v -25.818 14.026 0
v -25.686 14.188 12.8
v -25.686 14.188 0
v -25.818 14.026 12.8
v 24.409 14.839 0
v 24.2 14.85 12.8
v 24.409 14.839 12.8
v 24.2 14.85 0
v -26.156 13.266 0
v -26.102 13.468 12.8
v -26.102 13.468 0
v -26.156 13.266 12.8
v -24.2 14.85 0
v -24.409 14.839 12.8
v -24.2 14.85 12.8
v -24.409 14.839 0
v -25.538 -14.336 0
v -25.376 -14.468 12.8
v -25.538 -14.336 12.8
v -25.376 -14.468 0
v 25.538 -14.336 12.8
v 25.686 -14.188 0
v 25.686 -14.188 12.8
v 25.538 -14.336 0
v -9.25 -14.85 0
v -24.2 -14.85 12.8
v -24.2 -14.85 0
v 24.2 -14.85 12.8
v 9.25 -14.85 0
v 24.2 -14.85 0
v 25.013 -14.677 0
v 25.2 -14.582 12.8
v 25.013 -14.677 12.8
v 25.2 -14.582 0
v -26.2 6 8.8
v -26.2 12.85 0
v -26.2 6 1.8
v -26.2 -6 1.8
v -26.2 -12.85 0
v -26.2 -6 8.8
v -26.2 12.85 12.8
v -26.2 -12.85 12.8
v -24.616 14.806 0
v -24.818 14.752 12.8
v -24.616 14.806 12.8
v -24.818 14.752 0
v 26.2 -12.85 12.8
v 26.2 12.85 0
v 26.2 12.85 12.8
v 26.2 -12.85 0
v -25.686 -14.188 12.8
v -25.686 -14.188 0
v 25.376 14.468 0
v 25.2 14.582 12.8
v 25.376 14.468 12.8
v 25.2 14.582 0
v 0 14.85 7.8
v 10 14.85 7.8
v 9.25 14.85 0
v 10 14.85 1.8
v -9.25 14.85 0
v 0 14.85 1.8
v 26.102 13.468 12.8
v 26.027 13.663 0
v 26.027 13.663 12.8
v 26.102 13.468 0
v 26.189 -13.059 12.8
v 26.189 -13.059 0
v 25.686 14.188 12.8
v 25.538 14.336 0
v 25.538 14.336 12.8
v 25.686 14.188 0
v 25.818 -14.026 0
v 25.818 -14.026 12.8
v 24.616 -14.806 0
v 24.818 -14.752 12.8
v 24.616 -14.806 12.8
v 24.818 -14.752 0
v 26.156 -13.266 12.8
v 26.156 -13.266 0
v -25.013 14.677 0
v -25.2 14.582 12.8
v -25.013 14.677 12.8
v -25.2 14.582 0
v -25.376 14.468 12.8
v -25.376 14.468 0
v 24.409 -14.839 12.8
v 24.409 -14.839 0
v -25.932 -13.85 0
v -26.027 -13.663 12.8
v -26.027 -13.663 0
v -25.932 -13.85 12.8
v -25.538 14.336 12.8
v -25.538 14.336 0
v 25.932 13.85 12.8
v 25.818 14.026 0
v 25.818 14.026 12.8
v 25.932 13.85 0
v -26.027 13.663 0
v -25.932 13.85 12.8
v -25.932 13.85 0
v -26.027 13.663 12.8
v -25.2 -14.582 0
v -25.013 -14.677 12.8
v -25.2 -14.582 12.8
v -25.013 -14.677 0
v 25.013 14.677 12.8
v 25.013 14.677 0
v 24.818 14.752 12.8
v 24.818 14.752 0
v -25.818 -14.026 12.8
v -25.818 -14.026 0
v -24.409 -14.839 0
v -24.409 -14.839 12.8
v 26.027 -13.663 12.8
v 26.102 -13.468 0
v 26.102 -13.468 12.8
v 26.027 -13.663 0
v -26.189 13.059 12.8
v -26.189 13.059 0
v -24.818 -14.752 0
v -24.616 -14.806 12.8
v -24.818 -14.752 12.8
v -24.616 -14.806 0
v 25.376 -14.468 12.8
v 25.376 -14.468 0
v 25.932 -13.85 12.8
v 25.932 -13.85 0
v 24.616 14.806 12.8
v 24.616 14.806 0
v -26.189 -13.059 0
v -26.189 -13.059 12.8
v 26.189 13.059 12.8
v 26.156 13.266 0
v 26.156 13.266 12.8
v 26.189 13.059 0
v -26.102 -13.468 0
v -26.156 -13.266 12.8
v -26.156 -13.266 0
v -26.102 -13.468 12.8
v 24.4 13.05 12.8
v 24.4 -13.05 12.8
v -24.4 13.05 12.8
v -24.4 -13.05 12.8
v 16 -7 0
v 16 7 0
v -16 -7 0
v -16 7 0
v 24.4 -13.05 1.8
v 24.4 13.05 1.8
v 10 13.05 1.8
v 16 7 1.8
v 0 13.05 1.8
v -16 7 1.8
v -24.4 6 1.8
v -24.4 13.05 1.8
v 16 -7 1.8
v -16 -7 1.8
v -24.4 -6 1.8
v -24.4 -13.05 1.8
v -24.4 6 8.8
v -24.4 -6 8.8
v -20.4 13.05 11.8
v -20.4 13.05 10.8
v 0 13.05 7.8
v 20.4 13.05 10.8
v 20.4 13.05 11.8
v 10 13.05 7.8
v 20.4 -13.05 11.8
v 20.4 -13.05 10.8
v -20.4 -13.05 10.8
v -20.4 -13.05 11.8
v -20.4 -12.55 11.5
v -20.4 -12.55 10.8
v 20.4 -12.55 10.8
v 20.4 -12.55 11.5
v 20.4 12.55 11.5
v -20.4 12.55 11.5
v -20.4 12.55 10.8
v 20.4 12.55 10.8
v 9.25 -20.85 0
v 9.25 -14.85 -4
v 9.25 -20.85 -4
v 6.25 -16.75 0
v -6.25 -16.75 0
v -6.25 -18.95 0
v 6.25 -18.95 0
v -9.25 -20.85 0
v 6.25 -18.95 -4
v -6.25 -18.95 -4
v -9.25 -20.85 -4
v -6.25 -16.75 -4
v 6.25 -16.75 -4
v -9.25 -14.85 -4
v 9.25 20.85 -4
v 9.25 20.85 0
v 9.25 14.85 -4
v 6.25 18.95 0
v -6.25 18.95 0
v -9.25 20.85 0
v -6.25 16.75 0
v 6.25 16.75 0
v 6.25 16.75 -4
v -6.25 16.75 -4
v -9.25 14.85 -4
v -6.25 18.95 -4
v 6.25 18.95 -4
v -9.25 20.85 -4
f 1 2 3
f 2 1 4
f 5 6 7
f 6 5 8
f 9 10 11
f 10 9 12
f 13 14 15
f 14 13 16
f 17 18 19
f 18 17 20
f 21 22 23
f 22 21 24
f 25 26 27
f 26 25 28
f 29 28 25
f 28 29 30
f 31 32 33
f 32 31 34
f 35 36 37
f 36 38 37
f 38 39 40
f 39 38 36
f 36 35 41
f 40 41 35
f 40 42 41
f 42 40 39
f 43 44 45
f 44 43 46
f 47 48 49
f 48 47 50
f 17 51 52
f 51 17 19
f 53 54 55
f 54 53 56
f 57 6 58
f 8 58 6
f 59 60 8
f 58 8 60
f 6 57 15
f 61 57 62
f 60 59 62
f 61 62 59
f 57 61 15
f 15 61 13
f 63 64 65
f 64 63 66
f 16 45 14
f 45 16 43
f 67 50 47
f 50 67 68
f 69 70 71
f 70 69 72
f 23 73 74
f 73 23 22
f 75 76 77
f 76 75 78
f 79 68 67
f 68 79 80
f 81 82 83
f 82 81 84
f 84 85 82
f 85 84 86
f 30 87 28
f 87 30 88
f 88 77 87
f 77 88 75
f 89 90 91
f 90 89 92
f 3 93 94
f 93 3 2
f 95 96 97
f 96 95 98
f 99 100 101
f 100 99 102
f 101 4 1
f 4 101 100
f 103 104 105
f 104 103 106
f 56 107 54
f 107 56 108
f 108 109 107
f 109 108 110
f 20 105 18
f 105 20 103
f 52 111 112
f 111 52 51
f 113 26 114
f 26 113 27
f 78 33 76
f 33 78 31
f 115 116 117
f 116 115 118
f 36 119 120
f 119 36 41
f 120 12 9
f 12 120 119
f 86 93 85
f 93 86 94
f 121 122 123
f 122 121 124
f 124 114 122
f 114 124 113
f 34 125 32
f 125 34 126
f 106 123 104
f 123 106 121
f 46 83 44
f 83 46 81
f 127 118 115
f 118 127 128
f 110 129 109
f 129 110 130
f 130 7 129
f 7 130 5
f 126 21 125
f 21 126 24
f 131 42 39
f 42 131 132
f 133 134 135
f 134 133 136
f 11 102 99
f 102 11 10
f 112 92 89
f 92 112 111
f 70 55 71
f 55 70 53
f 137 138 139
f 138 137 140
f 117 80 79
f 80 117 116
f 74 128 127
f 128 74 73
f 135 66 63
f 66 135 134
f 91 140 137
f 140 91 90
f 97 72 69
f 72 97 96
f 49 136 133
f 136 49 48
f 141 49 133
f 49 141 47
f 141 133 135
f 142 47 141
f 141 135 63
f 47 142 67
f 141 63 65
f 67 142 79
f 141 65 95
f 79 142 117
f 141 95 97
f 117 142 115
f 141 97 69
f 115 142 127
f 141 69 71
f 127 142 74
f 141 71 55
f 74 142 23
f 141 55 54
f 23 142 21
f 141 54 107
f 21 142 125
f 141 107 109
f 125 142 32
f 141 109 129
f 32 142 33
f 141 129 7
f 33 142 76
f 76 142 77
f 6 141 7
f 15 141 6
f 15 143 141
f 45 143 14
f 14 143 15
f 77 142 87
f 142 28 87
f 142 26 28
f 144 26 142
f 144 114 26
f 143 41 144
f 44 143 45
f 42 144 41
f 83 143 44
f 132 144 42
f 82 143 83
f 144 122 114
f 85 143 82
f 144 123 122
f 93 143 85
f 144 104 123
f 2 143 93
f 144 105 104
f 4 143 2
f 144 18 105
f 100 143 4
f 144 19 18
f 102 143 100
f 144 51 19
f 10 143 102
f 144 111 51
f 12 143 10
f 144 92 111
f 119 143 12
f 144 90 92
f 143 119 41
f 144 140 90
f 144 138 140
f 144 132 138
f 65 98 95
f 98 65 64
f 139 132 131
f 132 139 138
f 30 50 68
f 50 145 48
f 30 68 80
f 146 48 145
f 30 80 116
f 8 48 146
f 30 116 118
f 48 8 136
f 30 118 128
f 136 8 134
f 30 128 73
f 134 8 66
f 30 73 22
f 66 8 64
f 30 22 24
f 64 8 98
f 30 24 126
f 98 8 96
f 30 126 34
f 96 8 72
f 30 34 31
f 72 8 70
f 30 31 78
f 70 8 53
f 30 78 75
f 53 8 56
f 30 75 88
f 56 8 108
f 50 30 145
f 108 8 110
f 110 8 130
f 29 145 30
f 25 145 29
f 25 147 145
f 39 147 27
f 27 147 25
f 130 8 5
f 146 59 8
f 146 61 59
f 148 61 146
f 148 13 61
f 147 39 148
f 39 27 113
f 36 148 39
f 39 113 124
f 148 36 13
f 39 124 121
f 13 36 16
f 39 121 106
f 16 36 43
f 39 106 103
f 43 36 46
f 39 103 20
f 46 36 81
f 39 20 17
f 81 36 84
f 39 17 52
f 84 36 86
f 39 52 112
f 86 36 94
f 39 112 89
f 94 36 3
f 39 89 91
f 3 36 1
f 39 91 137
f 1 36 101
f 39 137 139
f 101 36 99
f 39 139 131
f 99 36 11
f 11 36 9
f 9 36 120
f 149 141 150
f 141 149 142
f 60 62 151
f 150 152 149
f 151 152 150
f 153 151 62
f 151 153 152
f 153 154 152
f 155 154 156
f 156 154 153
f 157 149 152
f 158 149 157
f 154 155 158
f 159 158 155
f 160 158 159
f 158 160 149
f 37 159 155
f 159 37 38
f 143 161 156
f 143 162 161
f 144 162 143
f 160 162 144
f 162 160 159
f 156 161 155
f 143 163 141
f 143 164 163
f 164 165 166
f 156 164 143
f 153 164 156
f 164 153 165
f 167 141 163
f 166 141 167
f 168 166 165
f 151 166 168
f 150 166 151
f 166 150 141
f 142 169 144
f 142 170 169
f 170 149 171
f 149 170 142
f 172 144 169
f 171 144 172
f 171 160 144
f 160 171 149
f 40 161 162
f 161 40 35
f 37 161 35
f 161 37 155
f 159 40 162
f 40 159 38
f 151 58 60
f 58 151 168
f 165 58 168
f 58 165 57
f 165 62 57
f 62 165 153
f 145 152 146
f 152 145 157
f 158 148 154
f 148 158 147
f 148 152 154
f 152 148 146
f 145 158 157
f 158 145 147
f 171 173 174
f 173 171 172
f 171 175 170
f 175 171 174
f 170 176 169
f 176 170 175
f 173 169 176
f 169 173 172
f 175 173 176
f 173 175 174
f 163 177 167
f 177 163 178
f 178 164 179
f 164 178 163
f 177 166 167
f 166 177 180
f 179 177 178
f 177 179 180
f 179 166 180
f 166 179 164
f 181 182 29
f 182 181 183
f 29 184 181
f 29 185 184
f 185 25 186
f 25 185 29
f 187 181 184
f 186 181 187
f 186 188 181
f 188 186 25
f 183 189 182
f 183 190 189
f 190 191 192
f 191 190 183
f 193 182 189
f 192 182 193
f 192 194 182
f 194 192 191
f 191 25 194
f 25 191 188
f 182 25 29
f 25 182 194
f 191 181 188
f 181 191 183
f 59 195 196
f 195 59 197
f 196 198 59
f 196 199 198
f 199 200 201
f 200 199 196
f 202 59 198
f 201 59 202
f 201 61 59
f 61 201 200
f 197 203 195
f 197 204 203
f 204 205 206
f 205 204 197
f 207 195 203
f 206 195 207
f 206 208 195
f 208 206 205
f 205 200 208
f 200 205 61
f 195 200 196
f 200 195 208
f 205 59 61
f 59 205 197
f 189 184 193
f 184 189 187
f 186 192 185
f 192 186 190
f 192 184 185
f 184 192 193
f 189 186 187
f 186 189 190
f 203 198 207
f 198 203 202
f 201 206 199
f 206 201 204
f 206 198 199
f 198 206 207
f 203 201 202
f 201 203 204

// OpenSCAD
// =============================================================================
// CogniLink Assistive Technology - Master Parametric Cradle System
// =============================================================================
// OpenSCAD Parametric Cradle Generator supporting 6 anatomical configurations:
//   - UNIVERSAL : Flat base carrier with dual 15x2.5mm strap loops
//   - FINGER    : Dorsal proximal phalanx saddle with lateral ring cinch loops
//   - WRIST     : Broad carpal saddle with dual 20.5x2.8mm medical band slots
//   - EYEGLASS  : Tension-fit dual-jaw clip for 2.5-5.0mm spectacle frame arms
//   - HEADBAND  : Cranial curved plate with dual 26x3.0mm elastic band slots
//   - HALLUX    : Great toe saddle with distal pedal interphalangeal relief
//
// Designed for FDM printing in PETG (0.20mm layer height, 100% infill).
// Correlates with:
//   - CogniLink IEEE Journal Paper (Section IV-B, Table XI BOM, Fig. 1)
// =============================================================================

/* [Configuration & Mounting Mode] */
// Select anatomical mounting mode
MOUNT_TYPE = "FINGER"; // [UNIVERSAL: Universal Cradle, FINGER: Finger Ring Mount, WRIST: Wrist Strap Mount, EYEGLASS: Eyeglass Temple Clip, HEADBAND: Headband Mount, HALLUX: Hallux Toe Mount]

// Display M5StickC reference mockup inside cradle
SHOW_MOCKUP = false;

/* [General Dimensions & 3D Printing Tolerances] */
// M5StickC module length (mm)
MODULE_LENGTH = 48.2;
// M5StickC module width (mm)
MODULE_WIDTH  = 25.5;
// M5StickC module thickness (mm)
MODULE_HEIGHT = 13.7;

// Internal clearance per side for FDM snap-fit (mm)
TOLERANCE = 0.30;
// Wall thickness for structural rigidity (mm)
WALL_THICKNESS = 1.8;
// Base floor thickness (mm)
BASE_THICKNESS = 1.8;
// Depth of module pocket (mm) - leaves top open for screen/button access
POCKET_DEPTH = 11.0;
// Inward snap lip overhang along top edges (mm)
SNAP_LIP_DEPTH = 0.50;

/* [Anatomical Sizing Parameters] */
// Finger proximal phalanx inner diameter (mm)
FINGER_INNER_DIAMETER = 21.0;
// Wrist carpal curvature radius (mm)
WRIST_CARPAL_RADIUS = 32.0;
// Headband frontal curvature radius (mm)
HEADBAND_CRANIAL_RADIUS = 80.0;
// Hallux (great toe) inner diameter (mm)
HALLUX_INNER_DIAMETER = 26.0;
// Eyeglass temple arm clamping slot thickness (mm)
EYEGLASS_TEMPLE_THICKNESS = 3.2;

/* [Strap Loop Dimensions] */
// Finger ring strap width (mm)
STRAP_WIDTH_FINGER = 12.0;
// Wrist strap width (mm)
STRAP_WIDTH_WRIST = 20.0;
// Headband elastic width (mm)
STRAP_WIDTH_HEADBAND = 25.0;

/* [Fine Tuning] */
// Curve rendering resolution
$fn = 60;

// Calculated internal and external dimensions
cav_l = MODULE_LENGTH + 2 * TOLERANCE;
cav_w = MODULE_WIDTH  + 2 * TOLERANCE;
out_l = cav_l + 2 * WALL_THICKNESS;
out_w = cav_w + 2 * WALL_THICKNESS;
tot_h = BASE_THICKNESS + POCKET_DEPTH;

// =============================================================================
// Core Cradle Module (Universal Carrier Sleeve)
// =============================================================================

module core_cradle_sleeve() {
    difference() {
        // Outer cradle body with radiused external corners
        hull() {
            r_c = 2.0;
            translate([-out_l/2 + r_c, -out_w/2 + r_c, 0]) cylinder(r=r_c, h=tot_h);
            translate([ out_l/2 - r_c, -out_w/2 + r_c, 0]) cylinder(r=r_c, h=tot_h);
            translate([-out_l/2 + r_c,  out_w/2 - r_c, 0]) cylinder(r=r_c, h=tot_h);
            translate([ out_l/2 - r_c,  out_w/2 - r_c, 0]) cylinder(r=r_c, h=tot_h);
        }

        // Inner module pocket (Z from BASE_THICKNESS to top)
        translate([-cav_l/2, -cav_w/2, BASE_THICKNESS])
            cube([cav_l, cav_w, POCKET_DEPTH + 1.0]);

        // USB-C port cutout on -X bottom wall (allows charging & programming)
        translate([-out_l/2 - 0.5, -6.0, BASE_THICKNESS])
            cube([WALL_THICKNESS + 1.0, 12.0, 7.0]);

        // Button B (Reset) cutout on +Y lateral wall
        translate([0.0, cav_w/2 - 0.5, BASE_THICKNESS])
            cube([10.0, WALL_THICKNESS + 1.0, 6.0]);

        // Battery ventilation & mass-reduction slot in floor
        translate([-16.0, -7.0, -0.5])
            cube([32.0, 14.0, BASE_THICKNESS + 1.0]);
    }

    // Snap-fit retention lips along top long edges (+/- Y)
    // Chamfered lead-in lip for easy push-in snapping
    // Lip on -Y wall
    translate([-cav_l/2 + 4.0, -cav_w/2, tot_h - 1.0])
        rotate([0, 90, 0])
        linear_extrude(cav_l - 8.0)
        polygon(points=[[0, 0], [1.0, 0], [1.0, SNAP_LIP_DEPTH], [0.3, SNAP_LIP_DEPTH]]);

    // Lip on +Y wall
    translate([-cav_l/2 + 4.0, cav_w/2, tot_h - 1.0])
        rotate([0, 90, 0])
        linear_extrude(cav_l - 8.0)
        polygon(points=[[0, 0], [1.0, 0], [1.0, -SNAP_LIP_DEPTH], [0.3, -SNAP_LIP_DEPTH]]);
}

// =============================================================================
// Anatomical Mount Assemblies
// =============================================================================

// 1. UNIVERSAL CRADLE
module mount_universal() {
    core_cradle_sleeve();

    // Lateral flanged strap loops (+/- Y)
    flange_ext = 8.0;
    flange_th = 2.4;
    slot_l = 15.0;
    slot_w = 2.5;

    difference() {
        union() {
            // -Y Flange
            translate([-out_l/2, -out_w/2 - flange_ext, 0])
                cube([out_l, flange_ext, flange_th]);
            // +Y Flange
            translate([-out_l/2, out_w/2, 0])
                cube([out_l, flange_ext, flange_th]);
        }
        // Slots on -Y
        translate([-15.0 - slot_l/2, -out_w/2 - flange_ext/2 - slot_w/2, -0.5]) cube([slot_l, slot_w, flange_th + 1]);
        translate([ 15.0 - slot_l/2, -out_w/2 - flange_ext/2 - slot_w/2, -0.5]) cube([slot_l, slot_w, flange_th + 1]);
        // Slots on +Y
        translate([-15.0 - slot_l/2,  out_w/2 + flange_ext/2 - slot_w/2, -0.5]) cube([slot_l, slot_w, flange_th + 1]);
        translate([ 15.0 - slot_l/2,  out_w/2 + flange_ext/2 - slot_w/2, -0.5]) cube([slot_l, slot_w, flange_th + 1]);
    }
}

// 2. PRIMARY FINGER RING MOUNT
module mount_finger_ring() {
    core_cradle_sleeve();

    r_in = FINGER_INNER_DIAMETER / 2.0;
    th = 2.2;
    r_out = r_in + th;

    // Curved anatomical dorsal phalanx saddle under cradle
    difference() {
        translate([-out_l/2, 0, 0])
            rotate([0, 90, 0])
            cylinder(r=r_out, h=out_l);

        // Subtracted finger clearance cylinder
        translate([-out_l/2 - 1, 0, 0])
            rotate([0, 90, 0])
            cylinder(r=r_in, h=out_l + 2);

        // Cut off lower half
        translate([-out_l/2 - 1, -r_out - 1, -2*r_out])
            cube([out_l + 2, 2*r_out + 2, 2*r_out]);

        // Flatten top to join cradle floor
        translate([-out_l/2 - 1, -r_out - 1, 0.01])
            cube([out_l + 2, 2*r_out + 2, r_out]);
    }

    // Lateral ring strap cinch brackets (+/- Y) for 12mm silicone ring band
    loop_w = 6.0;
    slot_l = STRAP_WIDTH_FINGER + 0.5;
    slot_th = 2.2;

    difference() {
        union() {
            translate([-slot_l/2 - 3, -out_w/2 - loop_w, -4.0]) cube([slot_l + 6, loop_w, 4.0]);
            translate([-slot_l/2 - 3,  out_w/2,          -4.0]) cube([slot_l + 6, loop_w, 4.0]);
        }
        // Slots
        translate([-slot_l/2, -out_w/2 - loop_w/2 - slot_th/2, -4.5]) cube([slot_l, slot_th, 5.0]);
        translate([-slot_l/2,  out_w/2 + loop_w/2 - slot_th/2, -4.5]) cube([slot_l, slot_th, 5.0]);
    }
}

// 3. WRIST STRAP MOUNT
module mount_wrist() {
    core_cradle_sleeve();

    r_in = WRIST_CARPAL_RADIUS;
    th = 2.6;
    r_out = r_in + th;
    w_len = out_l + 6.0;
    w_width = 56.0;

    // Broad carpal saddle
    difference() {
        translate([-w_len/2, 0, 0])
            rotate([0, 90, 0])
            cylinder(r=r_out, h=w_len);

        translate([-w_len/2 - 1, 0, 0])
            rotate([0, 90, 0])
            cylinder(r=r_in, h=w_len + 2);

        translate([-w_len/2 - 1, -r_out - 1, -2*r_out])
            cube([w_len + 2, 2*r_out + 2, 2*r_out]);

        translate([-w_len/2 - 1, -r_out - 1, 0.01])
            cube([w_len + 2, 2*r_out + 2, r_out]);
    }

    // Dual 20mm wristband strap loops on -X and +X ends
    wing_len = 8.0;
    slot_w = STRAP_WIDTH_WRIST + 0.8;
    slot_th = 2.8;

    difference() {
        union() {
            translate([-w_len/2 - wing_len, -w_width/2, -3.0]) cube([wing_len, w_width, 3.0]);
            translate([ w_len/2,            -w_width/2, -3.0]) cube([wing_len, w_width, 3.0]);
        }
        translate([-w_len/2 - wing_len/2 - slot_th/2, -slot_w/2, -3.5]) cube([slot_th, slot_w, 4.0]);
        translate([ w_len/2 + wing_len/2 - slot_th/2, -slot_w/2, -3.5]) cube([slot_th, slot_w, 4.0]);
    }
}

// 4. EYEGLASS TEMPLE CLIP
module mount_eyeglass_clip() {
    core_cradle_sleeve();

    clip_len = 32.0;
    clip_gap = EYEGLASS_TEMPLE_THICKNESS;
    jaw_th = 2.0;
    clip_depth = 9.0;
    bridge_w = 4.0;

    // Lateral bridge from cradle
    translate([-clip_len/2, -out_w/2 - bridge_w, 2.0])
        cube([clip_len, bridge_w, clip_depth]);

    // Compliant J-clip channel
    y_inner = -out_w/2 - bridge_w;
    // Inner leg
    translate([-clip_len/2, y_inner - jaw_th, 0])
        cube([clip_len, jaw_th, clip_depth + 2.0]);
    // Top connecting arch
    translate([-clip_len/2, y_inner - jaw_th - clip_gap - jaw_th, clip_depth])
        cube([clip_len, clip_gap + 2*jaw_th, 2.0]);
    // Outer compliant clamping leg
    translate([-clip_len/2, y_inner - 2*jaw_th - clip_gap, 0])
        cube([clip_len, jaw_th, clip_depth + 2.0]);
    // Chamfered lead-in lip for easy sliding onto spectacles
    translate([-clip_len/2, y_inner - 2*jaw_th - clip_gap - 1.2, 0])
        cube([clip_len, 1.2, 1.8]);
}

// 5. FOREHEAD HEADBAND MOUNT
module mount_headband() {
    core_cradle_sleeve();

    r_in = HEADBAND_CRANIAL_RADIUS;
    th = 2.6;
    r_out = r_in + th;
    p_len = out_l + 10.0;
    p_width = 64.0;

    // Cranial curved contoured base
    difference() {
        translate([-p_len/2, 0, 0])
            rotate([0, 90, 0])
            cylinder(r=r_out, h=p_len);

        translate([-p_len/2 - 1, 0, 0])
            rotate([0, 90, 0])
            cylinder(r=r_in, h=p_len + 2);

        translate([-p_len/2 - 1, -r_out - 1, -2*r_out])
            cube([p_len + 2, 2*r_out + 2, 2*r_out]);

        translate([-p_len/2 - 1, -r_out - 1, 0.01])
            cube([p_len + 2, 2*r_out + 2, r_out]);
    }

    // Dual 25mm elastic band brackets (+/- Y)
    strap_w = STRAP_WIDTH_HEADBAND + 1.0;
    strap_th = 3.0;
    wing_w = 8.0;

    difference() {
        union() {
            translate([-p_len/2, -p_width/2 - wing_w, -4.0]) cube([p_len, wing_w, 4.0]);
            translate([-p_len/2,  p_width/2,          -4.0]) cube([p_len, wing_w, 4.0]);
        }
        translate([-strap_w/2, -p_width/2 - wing_w/2 - strap_th/2, -4.5]) cube([strap_w, strap_th, 5.0]);
        translate([-strap_w/2,  p_width/2 + wing_w/2 - strap_th/2, -4.5]) cube([strap_w, strap_th, 5.0]);
    }
}

// 6. HALLUX (BIG TOE) MOUNT
module mount_hallux() {
    core_cradle_sleeve();

    r_in = HALLUX_INNER_DIAMETER / 2.0;
    th = 2.4;
    r_out = r_in + th;

    // Great toe saddle
    difference() {
        translate([-out_l/2, 0, 0])
            rotate([0, 90, 0])
            cylinder(r=r_out, h=out_l);

        translate([-out_l/2 - 1, 0, 0])
            rotate([0, 90, 0])
            cylinder(r=r_in, h=out_l + 2);

        translate([-out_l/2 - 1, -r_out - 1, -2*r_out])
            cube([out_l + 2, 2*r_out + 2, 2*r_out]);

        translate([-out_l/2 - 1, -r_out - 1, 0.01])
            cube([out_l + 2, 2*r_out + 2, r_out]);
    }

    // Lateral toe strap loops (+/- Y) for 15mm strap
    loop_w = 7.0;
    slot_l = 15.5;
    slot_th = 2.4;

    difference() {
        union() {
            translate([-slot_l/2 - 3.5, -out_w/2 - loop_w, -4.5]) cube([slot_l + 7, loop_w, 4.5]);
            translate([-slot_l/2 - 3.5,  out_w/2,          -4.5]) cube([slot_l + 7, loop_w, 4.5]);
        }
        translate([-slot_l/2, -out_w/2 - loop_w/2 - slot_th/2, -5.0]) cube([slot_l, slot_th, 5.5]);
        translate([-slot_l/2,  out_w/2 + loop_w/2 - slot_th/2, -5.0]) cube([slot_l, slot_th, 5.5]);
    }
}

// =============================================================================
// Top-Level Assembly Dispatcher
// =============================================================================

module cognilink_cradle(mount=MOUNT_TYPE) {
    color([0.2, 0.65, 0.85]) {
        if (mount == "UNIVERSAL") mount_universal();
        else if (mount == "FINGER")    mount_finger_ring();
        else if (mount == "WRIST")     mount_wrist();
        else if (mount == "EYEGLASS")  mount_eyeglass_clip();
        else if (mount == "HEADBAND")  mount_headband();
        else if (mount == "HALLUX")    mount_hallux();
        else mount_finger_ring();
    }

    // Optional reference mockup of the M5StickC seated inside
    if (SHOW_MOCKUP) {
        translate([0, 0, BASE_THICKNESS])
            m5stickc_mockup();
    }
}

// Simple internal representation of M5StickC for mockup preview
module m5stickc_mockup() {
    color([0.98, 0.45, 0.05, 0.85]) {
        translate([-48.2/2, -25.5/2, 0])
            cube([48.2, 25.5, 13.7]);
    }
    // LCD
    color([0.1, 0.1, 0.12]) {
        translate([-13.0, -8.0, 13.7])
            cube([26.0, 16.0, 0.2]);
    }
    // Button A
    color([0.3, 0.3, 0.3]) {
        translate([15.0, -5.0, 13.7])
            cube([6.0, 10.0, 0.5]);
    }
}

// Render active mount configuration
cognilink_cradle(MOUNT_TYPE);
